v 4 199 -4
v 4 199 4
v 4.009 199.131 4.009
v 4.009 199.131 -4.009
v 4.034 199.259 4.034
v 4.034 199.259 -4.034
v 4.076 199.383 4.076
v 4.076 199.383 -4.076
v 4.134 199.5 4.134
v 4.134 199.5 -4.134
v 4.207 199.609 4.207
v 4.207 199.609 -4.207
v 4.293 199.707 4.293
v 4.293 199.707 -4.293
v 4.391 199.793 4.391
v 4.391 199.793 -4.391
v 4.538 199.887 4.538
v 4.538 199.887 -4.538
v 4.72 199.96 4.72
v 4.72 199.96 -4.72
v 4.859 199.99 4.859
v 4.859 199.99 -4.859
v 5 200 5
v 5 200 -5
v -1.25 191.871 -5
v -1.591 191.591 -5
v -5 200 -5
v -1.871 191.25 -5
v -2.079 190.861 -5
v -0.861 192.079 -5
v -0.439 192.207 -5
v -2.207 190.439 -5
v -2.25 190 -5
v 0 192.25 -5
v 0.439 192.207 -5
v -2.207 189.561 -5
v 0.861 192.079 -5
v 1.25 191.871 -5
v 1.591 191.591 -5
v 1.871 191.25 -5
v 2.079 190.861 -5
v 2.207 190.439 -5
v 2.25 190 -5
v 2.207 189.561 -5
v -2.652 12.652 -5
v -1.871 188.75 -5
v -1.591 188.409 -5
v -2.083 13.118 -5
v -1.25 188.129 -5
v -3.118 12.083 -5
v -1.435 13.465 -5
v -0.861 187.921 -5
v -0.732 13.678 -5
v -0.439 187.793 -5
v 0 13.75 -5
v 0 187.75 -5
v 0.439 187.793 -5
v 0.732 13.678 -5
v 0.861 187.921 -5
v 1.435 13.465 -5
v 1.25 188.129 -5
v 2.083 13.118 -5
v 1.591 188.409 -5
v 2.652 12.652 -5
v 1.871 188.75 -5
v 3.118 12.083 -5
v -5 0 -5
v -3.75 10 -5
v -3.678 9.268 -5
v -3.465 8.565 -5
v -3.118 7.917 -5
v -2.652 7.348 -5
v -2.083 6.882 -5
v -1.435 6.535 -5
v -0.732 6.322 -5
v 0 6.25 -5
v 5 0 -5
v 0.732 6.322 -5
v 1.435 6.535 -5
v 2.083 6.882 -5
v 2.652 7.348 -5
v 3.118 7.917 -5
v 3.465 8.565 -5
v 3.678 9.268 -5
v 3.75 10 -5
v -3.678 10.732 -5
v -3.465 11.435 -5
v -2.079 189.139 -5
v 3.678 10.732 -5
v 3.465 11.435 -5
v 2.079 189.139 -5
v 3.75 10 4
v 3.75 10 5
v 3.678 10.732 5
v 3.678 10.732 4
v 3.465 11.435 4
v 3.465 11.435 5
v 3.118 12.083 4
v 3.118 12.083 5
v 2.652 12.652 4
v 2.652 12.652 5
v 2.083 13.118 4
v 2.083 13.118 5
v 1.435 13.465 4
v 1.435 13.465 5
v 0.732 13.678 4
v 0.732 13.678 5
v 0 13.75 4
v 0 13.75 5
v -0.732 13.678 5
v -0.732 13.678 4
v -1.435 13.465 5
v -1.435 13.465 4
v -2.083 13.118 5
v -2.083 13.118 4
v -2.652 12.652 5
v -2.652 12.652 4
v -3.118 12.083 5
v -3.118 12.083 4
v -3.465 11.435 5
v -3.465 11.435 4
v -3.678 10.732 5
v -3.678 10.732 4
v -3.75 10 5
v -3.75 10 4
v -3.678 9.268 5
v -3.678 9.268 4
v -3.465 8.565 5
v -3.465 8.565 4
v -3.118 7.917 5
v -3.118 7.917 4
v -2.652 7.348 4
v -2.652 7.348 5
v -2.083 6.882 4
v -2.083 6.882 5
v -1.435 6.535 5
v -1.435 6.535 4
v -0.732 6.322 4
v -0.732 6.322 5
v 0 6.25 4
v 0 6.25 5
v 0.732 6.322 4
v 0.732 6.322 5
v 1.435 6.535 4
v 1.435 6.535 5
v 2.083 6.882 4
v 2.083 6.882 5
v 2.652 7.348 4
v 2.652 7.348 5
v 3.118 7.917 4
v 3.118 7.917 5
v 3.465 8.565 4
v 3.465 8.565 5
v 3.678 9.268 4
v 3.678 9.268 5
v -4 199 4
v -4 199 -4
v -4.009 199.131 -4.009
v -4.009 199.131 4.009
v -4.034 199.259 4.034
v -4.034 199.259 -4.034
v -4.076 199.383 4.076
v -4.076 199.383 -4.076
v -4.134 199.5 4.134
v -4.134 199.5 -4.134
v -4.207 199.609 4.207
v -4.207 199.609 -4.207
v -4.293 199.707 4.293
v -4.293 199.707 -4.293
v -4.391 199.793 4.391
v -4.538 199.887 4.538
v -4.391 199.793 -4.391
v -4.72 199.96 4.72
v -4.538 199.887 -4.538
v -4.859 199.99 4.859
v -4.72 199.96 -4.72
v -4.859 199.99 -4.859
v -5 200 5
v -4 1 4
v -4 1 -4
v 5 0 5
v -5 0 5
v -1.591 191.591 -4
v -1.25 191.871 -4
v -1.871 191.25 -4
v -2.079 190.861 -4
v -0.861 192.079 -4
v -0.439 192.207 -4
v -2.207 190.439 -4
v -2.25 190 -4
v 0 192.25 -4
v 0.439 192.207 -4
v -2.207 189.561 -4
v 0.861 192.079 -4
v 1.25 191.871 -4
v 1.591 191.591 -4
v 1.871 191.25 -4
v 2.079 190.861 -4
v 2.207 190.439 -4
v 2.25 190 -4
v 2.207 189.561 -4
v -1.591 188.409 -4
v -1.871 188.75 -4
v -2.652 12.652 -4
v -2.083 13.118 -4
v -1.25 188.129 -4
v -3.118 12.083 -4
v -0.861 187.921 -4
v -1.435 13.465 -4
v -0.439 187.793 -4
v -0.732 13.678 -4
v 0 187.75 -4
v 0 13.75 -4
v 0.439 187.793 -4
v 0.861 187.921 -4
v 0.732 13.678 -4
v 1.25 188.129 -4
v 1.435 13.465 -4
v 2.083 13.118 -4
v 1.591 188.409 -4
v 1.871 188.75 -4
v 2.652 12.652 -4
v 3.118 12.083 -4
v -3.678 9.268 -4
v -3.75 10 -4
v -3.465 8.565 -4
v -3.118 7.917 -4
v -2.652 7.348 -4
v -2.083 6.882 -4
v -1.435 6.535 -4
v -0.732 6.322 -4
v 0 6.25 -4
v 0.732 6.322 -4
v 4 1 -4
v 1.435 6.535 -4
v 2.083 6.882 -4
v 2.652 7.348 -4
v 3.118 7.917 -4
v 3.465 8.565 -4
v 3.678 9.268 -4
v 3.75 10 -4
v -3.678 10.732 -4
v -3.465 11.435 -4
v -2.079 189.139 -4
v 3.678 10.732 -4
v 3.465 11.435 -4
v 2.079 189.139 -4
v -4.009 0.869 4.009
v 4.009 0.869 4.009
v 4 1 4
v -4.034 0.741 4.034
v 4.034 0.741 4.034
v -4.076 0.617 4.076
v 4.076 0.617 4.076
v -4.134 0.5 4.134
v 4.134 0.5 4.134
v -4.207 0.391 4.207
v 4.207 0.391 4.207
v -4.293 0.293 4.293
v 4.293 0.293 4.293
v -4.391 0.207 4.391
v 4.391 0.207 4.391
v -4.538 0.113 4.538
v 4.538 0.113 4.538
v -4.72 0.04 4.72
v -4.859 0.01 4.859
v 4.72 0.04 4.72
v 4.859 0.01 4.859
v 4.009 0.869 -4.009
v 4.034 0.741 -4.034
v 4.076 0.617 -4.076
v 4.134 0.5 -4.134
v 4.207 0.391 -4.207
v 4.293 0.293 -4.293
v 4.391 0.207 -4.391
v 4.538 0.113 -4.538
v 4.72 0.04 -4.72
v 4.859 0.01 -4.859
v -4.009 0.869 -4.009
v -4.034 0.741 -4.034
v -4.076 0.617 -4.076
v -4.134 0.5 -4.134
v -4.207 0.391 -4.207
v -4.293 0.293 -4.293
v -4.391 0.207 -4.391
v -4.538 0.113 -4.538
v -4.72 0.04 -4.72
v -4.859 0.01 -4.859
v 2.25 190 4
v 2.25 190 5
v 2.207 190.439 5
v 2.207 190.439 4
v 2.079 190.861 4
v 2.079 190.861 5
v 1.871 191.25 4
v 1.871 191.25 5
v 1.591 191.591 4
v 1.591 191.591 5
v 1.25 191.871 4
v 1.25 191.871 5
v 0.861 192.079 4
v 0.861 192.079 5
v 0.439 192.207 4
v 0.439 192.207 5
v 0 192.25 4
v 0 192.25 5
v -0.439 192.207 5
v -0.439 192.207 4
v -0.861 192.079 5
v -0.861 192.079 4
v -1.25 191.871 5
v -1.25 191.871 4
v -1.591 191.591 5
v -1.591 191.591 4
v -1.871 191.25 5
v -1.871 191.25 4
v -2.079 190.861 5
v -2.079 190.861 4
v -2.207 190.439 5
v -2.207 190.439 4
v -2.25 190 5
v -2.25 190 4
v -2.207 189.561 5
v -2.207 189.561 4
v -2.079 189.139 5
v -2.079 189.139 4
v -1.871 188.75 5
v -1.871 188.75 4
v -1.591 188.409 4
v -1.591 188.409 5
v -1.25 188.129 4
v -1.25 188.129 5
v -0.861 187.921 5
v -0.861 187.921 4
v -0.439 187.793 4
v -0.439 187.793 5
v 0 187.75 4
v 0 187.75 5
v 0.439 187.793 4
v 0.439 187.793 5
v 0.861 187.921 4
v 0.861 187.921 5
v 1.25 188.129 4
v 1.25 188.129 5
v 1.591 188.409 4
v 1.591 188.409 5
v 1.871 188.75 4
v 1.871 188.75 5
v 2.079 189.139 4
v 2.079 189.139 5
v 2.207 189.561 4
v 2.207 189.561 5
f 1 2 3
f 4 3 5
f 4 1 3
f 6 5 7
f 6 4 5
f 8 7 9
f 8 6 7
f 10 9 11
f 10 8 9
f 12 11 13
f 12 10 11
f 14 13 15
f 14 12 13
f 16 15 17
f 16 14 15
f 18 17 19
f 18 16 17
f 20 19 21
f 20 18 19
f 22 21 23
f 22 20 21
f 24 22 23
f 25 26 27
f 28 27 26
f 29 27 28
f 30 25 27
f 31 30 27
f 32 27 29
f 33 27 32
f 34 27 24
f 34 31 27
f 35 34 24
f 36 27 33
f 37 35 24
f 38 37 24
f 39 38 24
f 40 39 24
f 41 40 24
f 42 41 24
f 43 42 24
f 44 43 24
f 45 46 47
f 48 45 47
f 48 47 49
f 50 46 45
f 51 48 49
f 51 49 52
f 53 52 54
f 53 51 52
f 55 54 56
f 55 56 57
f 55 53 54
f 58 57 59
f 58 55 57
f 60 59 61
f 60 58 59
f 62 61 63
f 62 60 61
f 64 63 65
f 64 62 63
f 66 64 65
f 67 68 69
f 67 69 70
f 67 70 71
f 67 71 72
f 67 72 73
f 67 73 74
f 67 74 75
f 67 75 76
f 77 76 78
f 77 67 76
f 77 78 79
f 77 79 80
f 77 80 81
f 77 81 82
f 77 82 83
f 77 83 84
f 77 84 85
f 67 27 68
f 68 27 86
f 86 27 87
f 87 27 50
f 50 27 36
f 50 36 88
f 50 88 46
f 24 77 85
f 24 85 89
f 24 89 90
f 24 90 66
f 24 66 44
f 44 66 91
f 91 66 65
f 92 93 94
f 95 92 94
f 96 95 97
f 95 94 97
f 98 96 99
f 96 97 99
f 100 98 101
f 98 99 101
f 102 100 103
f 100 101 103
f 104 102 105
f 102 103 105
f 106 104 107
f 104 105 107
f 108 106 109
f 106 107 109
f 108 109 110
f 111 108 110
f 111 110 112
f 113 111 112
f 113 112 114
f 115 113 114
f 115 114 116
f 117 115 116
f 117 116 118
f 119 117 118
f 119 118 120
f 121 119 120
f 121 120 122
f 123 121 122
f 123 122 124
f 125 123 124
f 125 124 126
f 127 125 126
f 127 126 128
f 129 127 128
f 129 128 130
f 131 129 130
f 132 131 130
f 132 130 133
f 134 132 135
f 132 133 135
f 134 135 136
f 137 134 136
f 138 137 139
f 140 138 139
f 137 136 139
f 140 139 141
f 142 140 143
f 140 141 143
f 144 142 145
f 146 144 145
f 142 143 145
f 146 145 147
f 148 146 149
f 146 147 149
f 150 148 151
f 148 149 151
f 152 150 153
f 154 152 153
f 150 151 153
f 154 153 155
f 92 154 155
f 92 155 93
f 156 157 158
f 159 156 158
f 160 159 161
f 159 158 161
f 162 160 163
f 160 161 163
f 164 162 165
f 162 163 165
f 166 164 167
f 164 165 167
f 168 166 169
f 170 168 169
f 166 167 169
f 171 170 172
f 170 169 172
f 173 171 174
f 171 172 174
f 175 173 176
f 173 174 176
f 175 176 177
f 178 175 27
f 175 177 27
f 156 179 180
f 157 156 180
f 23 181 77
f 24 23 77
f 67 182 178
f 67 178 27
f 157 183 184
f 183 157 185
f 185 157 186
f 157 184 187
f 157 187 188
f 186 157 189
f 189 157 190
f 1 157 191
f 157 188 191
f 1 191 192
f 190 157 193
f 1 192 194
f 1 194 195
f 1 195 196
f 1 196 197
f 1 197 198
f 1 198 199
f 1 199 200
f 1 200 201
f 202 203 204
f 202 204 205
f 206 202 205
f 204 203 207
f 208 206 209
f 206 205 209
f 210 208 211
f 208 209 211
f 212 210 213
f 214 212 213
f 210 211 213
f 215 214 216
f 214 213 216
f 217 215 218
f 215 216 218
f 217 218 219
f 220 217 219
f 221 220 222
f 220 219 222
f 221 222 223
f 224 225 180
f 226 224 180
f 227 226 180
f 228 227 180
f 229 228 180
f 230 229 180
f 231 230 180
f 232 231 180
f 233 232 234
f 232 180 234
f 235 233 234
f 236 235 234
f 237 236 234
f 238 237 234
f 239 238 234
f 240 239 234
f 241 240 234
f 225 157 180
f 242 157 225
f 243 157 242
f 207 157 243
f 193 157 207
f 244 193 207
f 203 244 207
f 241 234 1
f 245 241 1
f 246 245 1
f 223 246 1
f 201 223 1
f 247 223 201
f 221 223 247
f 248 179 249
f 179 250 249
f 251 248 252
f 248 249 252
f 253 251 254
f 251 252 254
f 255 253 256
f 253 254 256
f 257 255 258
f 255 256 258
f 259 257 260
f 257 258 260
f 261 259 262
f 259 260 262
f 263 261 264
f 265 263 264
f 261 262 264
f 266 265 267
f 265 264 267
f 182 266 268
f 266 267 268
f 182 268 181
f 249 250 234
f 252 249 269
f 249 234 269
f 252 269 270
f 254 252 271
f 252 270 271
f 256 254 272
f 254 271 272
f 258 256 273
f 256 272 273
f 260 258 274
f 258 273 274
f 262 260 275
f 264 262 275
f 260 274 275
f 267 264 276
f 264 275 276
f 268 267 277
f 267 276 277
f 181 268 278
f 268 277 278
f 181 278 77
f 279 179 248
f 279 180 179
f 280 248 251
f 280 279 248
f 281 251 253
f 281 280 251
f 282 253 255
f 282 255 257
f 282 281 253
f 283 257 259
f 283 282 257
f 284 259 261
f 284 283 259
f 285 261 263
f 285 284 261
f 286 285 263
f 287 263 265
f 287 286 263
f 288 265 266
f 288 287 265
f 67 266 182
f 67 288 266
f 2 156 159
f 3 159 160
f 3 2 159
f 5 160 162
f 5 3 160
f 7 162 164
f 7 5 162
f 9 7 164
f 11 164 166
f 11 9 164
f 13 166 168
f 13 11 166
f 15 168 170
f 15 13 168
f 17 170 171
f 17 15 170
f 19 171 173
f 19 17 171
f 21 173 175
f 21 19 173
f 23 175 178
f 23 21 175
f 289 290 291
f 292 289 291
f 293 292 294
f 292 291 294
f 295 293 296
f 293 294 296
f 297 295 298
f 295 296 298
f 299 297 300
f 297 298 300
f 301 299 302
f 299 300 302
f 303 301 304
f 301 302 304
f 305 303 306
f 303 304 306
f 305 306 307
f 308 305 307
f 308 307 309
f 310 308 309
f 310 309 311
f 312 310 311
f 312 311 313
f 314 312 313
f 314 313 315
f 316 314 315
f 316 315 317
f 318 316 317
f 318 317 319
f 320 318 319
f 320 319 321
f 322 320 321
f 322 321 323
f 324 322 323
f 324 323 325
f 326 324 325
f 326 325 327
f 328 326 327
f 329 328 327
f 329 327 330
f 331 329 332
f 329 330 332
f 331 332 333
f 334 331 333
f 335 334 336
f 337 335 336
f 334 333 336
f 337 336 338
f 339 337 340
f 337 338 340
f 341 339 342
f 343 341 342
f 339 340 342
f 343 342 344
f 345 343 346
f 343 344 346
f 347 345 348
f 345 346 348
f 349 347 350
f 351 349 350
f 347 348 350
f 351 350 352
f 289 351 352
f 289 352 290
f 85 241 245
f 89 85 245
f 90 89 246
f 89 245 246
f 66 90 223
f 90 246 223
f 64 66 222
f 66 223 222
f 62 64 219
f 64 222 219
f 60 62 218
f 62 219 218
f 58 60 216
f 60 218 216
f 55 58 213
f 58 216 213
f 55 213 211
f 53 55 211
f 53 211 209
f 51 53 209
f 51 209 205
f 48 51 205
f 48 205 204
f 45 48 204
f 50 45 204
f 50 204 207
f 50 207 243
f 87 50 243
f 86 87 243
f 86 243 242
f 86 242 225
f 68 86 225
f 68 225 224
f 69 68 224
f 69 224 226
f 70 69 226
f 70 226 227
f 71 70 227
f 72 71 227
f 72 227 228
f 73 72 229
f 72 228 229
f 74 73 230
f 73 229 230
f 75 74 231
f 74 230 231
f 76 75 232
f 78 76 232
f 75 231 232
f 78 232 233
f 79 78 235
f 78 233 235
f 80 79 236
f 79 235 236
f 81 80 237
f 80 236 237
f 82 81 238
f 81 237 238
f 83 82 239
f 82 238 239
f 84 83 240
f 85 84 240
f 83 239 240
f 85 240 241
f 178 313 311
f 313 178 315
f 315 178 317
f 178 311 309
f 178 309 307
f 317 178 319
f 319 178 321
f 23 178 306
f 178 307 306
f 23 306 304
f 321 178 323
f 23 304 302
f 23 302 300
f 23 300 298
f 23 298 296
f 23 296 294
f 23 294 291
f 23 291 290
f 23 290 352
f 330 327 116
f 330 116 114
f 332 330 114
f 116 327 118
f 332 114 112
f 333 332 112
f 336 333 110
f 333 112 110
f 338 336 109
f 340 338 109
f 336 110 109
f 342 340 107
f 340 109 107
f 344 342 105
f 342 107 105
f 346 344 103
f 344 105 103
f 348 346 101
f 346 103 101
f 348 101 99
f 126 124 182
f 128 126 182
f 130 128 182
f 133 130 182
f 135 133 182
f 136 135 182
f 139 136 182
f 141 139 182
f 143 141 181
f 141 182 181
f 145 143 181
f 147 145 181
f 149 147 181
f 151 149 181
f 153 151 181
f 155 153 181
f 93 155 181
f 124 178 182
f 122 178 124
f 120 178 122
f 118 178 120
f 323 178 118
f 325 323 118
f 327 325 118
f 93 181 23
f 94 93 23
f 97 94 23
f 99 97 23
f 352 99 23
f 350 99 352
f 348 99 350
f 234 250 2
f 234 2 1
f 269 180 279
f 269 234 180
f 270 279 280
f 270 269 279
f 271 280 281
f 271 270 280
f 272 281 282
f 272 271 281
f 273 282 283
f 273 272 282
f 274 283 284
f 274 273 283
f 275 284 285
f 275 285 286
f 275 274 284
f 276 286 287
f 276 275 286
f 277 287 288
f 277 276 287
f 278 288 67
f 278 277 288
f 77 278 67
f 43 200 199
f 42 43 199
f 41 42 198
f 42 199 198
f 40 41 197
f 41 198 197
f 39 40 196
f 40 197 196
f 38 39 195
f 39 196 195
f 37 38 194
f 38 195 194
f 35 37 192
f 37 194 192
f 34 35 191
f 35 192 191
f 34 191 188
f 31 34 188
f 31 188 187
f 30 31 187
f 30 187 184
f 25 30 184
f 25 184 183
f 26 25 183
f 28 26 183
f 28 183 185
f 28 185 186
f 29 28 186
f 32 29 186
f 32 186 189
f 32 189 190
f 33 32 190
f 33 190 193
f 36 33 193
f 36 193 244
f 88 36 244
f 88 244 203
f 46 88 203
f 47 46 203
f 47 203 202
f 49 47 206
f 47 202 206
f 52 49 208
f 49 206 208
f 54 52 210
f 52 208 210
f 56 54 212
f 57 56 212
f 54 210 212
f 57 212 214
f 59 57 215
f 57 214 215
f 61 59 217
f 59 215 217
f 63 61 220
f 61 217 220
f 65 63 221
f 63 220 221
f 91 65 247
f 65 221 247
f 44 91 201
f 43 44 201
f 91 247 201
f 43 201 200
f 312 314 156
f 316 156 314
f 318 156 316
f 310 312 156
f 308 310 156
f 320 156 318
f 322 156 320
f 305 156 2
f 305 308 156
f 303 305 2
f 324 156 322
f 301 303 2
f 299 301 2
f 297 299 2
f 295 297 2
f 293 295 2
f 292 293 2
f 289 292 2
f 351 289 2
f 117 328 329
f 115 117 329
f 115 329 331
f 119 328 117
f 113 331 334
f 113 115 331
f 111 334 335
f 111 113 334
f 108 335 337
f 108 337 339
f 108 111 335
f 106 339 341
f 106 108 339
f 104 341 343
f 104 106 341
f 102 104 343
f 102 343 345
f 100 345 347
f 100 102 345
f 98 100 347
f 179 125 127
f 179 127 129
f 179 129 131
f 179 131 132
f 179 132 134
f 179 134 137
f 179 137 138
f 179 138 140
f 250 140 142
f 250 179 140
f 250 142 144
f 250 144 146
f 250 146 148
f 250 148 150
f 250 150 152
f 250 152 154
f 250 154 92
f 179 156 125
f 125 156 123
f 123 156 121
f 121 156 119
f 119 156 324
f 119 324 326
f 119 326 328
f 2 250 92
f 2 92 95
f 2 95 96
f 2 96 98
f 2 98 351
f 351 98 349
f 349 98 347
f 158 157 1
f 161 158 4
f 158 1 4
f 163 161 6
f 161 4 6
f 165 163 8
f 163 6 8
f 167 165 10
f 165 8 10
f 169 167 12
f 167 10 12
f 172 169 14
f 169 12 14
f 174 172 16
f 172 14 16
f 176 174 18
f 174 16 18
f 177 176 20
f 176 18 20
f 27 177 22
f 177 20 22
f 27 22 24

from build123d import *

# Parameters (mm, degrees)
SKETCH1_W           = 10
SKETCH1_H           = 10
SKETCH1_W_2         = 8
SKETCH1_H_2         = 8
BOSS_EXTRUDE1_DEPTH = 200
FILLET2_R           = 1
SKETCH2_R           = 3.75
SKETCH2_R_2         = 2.25
CUT_EXTRUDE1_DEPTH  = 201.31225624


with BuildPart() as part:
    # Sketch1 → Boss-Extrude1 (new body)
    with BuildSketch(Plane(origin=(0, 0, 0), x_dir=(1, 0, 0), z_dir=(0, 1, 0))):
        Rectangle(SKETCH1_W, SKETCH1_H)
        Rectangle(SKETCH1_W_2, SKETCH1_H_2, mode=Mode.SUBTRACT)
    extrude(amount=BOSS_EXTRUDE1_DEPTH)

    # Fillet2
    fillet2_edges = [part.edges().sort_by_distance(p)[0] for p in [
        (4, 0, 0),
        (0, 0, -4),
        (-4, 0, 0),
        (0, 0, 4),
        (4, 200, 0),
        (0, 200, -4),
        (-4, 200, 0),
        (0, 200, 4),
    ]]
    fillet(fillet2_edges, radius=FILLET2_R - 0.0001)  # a hair under: the kernel refuses the full size

    # Sketch2 → Cut-Extrude1 (cut, through all)
    with BuildSketch(Plane.XY.offset(5)):
        with Locations((0, 10)):
            Circle(SKETCH2_R)
        with Locations((0, 190)):
            Circle(SKETCH2_R_2)
    extrude(amount=-CUT_EXTRUDE1_DEPTH, mode=Mode.SUBTRACT)


solid = part.part
